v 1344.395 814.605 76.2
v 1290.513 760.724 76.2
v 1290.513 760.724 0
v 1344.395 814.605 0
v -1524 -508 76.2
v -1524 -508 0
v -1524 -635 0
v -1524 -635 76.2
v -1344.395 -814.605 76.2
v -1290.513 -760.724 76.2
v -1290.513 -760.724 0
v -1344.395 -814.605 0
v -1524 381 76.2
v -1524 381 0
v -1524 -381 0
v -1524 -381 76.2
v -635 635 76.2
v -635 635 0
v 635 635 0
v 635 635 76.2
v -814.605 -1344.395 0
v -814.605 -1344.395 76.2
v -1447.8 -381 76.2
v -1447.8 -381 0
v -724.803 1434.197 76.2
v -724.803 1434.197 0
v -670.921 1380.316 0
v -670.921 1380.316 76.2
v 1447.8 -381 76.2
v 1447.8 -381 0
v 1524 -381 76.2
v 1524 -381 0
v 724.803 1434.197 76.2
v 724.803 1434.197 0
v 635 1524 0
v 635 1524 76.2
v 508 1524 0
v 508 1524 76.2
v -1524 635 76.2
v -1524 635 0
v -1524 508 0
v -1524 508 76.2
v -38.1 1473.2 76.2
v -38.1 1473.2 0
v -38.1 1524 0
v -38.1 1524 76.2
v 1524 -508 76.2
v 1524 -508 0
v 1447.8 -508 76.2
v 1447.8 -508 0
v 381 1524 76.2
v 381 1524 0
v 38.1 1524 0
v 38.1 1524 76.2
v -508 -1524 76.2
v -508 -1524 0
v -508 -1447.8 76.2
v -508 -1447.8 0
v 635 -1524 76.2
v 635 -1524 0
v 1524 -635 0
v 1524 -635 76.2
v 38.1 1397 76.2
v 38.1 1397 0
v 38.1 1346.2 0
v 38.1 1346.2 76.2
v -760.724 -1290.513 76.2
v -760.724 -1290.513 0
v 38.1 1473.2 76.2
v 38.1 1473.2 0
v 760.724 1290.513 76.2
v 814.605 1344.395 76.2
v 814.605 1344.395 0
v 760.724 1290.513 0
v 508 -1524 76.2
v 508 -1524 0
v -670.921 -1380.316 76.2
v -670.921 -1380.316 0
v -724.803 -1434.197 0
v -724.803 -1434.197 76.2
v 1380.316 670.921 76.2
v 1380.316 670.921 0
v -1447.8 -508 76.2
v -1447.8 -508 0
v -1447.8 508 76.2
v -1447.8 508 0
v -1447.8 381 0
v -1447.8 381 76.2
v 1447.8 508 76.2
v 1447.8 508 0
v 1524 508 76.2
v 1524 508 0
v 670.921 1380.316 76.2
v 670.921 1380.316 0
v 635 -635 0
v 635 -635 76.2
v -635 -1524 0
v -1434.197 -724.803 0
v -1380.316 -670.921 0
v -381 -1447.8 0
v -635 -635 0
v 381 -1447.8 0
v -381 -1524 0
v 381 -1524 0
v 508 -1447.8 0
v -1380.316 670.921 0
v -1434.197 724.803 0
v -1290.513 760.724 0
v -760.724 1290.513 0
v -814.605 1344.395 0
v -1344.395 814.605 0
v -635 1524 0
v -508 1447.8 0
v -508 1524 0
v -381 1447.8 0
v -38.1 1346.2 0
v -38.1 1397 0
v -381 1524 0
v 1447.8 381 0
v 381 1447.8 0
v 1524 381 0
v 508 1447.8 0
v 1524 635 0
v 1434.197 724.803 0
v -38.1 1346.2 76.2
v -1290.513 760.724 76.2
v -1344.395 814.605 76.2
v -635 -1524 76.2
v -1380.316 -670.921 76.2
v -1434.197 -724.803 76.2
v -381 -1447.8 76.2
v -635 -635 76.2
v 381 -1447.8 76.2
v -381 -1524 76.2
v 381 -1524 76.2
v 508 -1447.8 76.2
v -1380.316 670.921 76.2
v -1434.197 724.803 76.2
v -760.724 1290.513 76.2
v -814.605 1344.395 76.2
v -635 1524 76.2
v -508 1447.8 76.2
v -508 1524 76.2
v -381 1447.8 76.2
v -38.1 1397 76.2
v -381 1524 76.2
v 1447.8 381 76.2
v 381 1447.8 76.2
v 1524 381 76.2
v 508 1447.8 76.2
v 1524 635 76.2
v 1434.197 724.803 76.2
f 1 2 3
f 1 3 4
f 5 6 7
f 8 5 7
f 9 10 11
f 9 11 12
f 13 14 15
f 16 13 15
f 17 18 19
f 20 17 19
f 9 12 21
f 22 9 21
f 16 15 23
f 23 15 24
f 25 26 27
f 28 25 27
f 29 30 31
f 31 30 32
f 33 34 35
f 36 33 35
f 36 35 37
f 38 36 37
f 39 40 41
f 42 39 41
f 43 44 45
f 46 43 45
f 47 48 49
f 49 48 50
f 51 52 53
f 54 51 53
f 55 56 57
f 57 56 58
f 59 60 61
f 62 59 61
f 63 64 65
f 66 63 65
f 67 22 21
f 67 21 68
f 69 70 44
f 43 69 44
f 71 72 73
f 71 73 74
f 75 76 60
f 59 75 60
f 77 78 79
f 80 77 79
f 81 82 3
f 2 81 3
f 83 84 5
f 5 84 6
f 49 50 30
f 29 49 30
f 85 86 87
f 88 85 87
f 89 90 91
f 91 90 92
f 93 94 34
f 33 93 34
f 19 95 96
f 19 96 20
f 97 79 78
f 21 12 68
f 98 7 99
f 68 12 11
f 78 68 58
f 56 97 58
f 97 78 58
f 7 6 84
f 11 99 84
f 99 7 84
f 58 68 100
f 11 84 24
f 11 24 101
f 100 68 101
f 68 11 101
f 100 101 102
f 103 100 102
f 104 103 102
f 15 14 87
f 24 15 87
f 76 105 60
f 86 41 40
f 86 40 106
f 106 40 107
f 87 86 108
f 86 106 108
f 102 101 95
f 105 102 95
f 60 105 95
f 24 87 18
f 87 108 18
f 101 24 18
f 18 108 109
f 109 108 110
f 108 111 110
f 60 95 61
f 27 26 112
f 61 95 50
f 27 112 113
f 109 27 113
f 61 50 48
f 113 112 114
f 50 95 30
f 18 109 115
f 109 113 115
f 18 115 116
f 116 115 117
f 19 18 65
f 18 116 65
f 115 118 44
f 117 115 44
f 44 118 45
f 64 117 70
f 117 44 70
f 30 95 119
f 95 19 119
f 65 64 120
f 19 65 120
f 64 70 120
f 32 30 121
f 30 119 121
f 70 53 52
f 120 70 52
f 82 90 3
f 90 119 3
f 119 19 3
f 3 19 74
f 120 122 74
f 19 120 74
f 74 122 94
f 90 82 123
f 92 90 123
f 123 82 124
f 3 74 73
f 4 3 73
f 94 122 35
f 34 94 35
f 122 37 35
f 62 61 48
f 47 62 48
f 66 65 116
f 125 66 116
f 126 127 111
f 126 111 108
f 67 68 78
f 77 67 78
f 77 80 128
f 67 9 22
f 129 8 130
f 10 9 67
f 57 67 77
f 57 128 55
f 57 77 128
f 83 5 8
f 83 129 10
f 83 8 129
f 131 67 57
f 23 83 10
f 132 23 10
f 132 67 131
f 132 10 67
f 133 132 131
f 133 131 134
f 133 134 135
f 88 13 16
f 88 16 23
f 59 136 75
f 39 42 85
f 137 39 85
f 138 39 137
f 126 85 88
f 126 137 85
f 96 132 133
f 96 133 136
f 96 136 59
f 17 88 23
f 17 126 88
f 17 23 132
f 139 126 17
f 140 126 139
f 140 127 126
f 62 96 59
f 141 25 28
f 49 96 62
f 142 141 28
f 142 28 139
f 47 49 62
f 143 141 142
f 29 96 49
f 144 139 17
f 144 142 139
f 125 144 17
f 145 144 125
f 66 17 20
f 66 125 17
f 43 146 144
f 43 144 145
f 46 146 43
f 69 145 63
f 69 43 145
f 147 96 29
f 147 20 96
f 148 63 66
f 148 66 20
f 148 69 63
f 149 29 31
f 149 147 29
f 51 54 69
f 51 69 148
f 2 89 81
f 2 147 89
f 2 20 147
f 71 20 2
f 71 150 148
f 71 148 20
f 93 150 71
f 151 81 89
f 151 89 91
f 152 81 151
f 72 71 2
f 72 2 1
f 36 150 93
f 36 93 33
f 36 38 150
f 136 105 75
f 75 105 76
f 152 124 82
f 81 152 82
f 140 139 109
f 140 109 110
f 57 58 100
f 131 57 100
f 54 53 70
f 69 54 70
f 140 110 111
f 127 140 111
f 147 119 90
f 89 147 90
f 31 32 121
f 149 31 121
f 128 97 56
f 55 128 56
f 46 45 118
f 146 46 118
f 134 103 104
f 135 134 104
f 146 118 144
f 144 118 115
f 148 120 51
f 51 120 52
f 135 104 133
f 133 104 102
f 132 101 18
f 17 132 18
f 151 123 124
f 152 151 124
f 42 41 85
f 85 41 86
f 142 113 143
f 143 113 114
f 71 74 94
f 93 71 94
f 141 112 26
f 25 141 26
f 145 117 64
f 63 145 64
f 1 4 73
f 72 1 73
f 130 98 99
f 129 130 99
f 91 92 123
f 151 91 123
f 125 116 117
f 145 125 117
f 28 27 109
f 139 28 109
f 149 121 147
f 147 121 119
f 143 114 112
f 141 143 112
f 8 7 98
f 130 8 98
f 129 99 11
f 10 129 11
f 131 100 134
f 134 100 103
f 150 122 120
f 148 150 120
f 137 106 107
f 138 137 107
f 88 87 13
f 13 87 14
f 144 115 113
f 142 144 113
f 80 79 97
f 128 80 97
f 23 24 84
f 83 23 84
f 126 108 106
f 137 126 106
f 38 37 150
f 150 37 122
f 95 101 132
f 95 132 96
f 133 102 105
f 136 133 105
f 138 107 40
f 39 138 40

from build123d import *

# Parameters (mm, degrees)
F0_W     = 1270
F0_H     = 1270
F0_W_2   = 38.1
F0_H_2   = 76.2
F1_DEPTH = 25.4
F2_DEPTH = 76.2


# Not quite as in the source:
# - ends of sketch curves that miss each other by under 0.0002 mm in the source are joined


with BuildPart() as f1:
    # F0 (on Top) → F1 (new body)
    with BuildSketch(Plane.XY):
        Polygon((-1434.1974387893, 724.8025612107), (-1524, 635), (-1524, 508), (-1447.8, 508), (-1447.8, 381), (-1524, 381), (-1524, -381), (-1447.8, -381), (-1447.8, -508), (-1524, -508), (-1524, -635), (-1434.1974387893, -724.8025612107), (-1380.3159020629, -670.9210244843), (-1290.5133408522, -760.723585695), (-1344.3948775786, -814.6051224214), (-814.6051224214, -1344.3948775786), (-760.723585695, -1290.5133408522), (-670.9210244843, -1380.3159020629), (-724.8025612107, -1434.1974387893), (-635, -1524), (-508, -1524), (-508, -1447.8), (-381, -1447.8), (-381, -1524), (0, -1524), (381, -1524), (381, -1447.8), (508, -1447.8), (508, -1524), (635, -1524), (724.8025612107, -1434.1974387893), (670.9210244843, -1380.3159020629), (760.723585695, -1290.5133408522), (814.6051224214, -1344.3948775786), (1344.3948775786, -814.6051224214), (1290.5133408522, -760.723585695), (1380.3159020629, -670.9210244843), (1434.1974387893, -724.8025612107), (1524, -635), (1524, -508), (1447.8, -508), (1447.8, -381), (1524, -381), (1524, 381), (1447.8, 381), (1447.8, 508), (1524, 508), (1524, 635), (1434.1974387893, 724.8025612107), (1380.3159020629, 670.9210244843), (1290.5133408522, 760.723585695), (1344.3948775786, 814.6051224214), (814.6051224214, 1344.3948775786), (760.723585695, 1290.5133408522), (670.9210244843, 1380.3159020629), (724.8025612107, 1434.1974387893), (635, 1524), (508, 1524), (508, 1447.8), (381, 1447.8), (381, 1524), (38.1, 1524), (38.1, 1473.2), (38.1, 1397), (38.1, 1346.2), (-38.1, 1346.2), (-38.1, 1397), (-38.1, 1473.2), (-38.1, 1523.9999635696), (-381, 1524), (-381, 1447.8), (-508, 1447.8), (-508, 1524), (-635, 1524), (-724.8025612107, 1434.1974387893), (-670.9210244843, 1380.3159020629), (-760.723585695, 1290.5133408522), (-814.6051224214, 1344.3948775786), (-1344.3948775786, 814.6051224214), (-1290.5133408522, 760.723585695), (-1380.3159020629, 670.9210244843), align=None)
        Rectangle(F0_W, F0_H, mode=Mode.SUBTRACT)
        with Locations((-19.05, 1435.1)):
            Rectangle(F0_W_2, F0_H_2)
        with Locations((19.05, 1435.1)):
            Rectangle(F0_W_2, F0_H_2)
        Polygon((670.9210244843, -1380.3159020629), (724.8025612107, -1434.1974387893), (814.6051224214, -1344.3948775786), (760.723585695, -1290.5133408522), align=None)
        Polygon((1290.5133408522, -760.723585695), (1344.3948775786, -814.6051224214), (1434.1974387893, -724.8025612107), (1380.3159020629, -670.9210244843), align=None)
    extrude(amount=F1_DEPTH)

    # F0 (on Top) → F2 (join)
    with BuildSketch(Plane.XY):
        Polygon((-1434.1974387893, 724.8025612107), (-1524, 635), (-1524, 508), (-1447.8, 508), (-1447.8, 381), (-1524, 381), (-1524, -381), (-1447.8, -381), (-1447.8, -508), (-1524, -508), (-1524, -635), (-1434.1974387893, -724.8025612107), (-1380.3159020629, -670.9210244843), (-1290.5133408522, -760.723585695), (-1344.3948775786, -814.6051224214), (-814.6051224214, -1344.3948775786), (-760.723585695, -1290.5133408522), (-670.9210244843, -1380.3159020629), (-724.8025612107, -1434.1974387893), (-635, -1524), (-508, -1524), (-508, -1447.8), (-381, -1447.8), (-381, -1524), (0, -1524), (381, -1524), (381, -1447.8), (508, -1447.8), (508, -1524), (635, -1524), (724.8025612107, -1434.1974387893), (670.9210244843, -1380.3159020629), (760.723585695, -1290.5133408522), (814.6051224214, -1344.3948775786), (1344.3948775786, -814.6051224214), (1290.5133408522, -760.723585695), (1380.3159020629, -670.9210244843), (1434.1974387893, -724.8025612107), (1524, -635), (1524, -508), (1447.8, -508), (1447.8, -381), (1524, -381), (1524, 381), (1447.8, 381), (1447.8, 508), (1524, 508), (1524, 635), (1434.1974387893, 724.8025612107), (1380.3159020629, 670.9210244843), (1290.5133408522, 760.723585695), (1344.3948775786, 814.6051224214), (814.6051224214, 1344.3948775786), (760.723585695, 1290.5133408522), (670.9210244843, 1380.3159020629), (724.8025612107, 1434.1974387893), (635, 1524), (508, 1524), (508, 1447.8), (381, 1447.8), (381, 1524), (38.1, 1524), (38.1, 1473.2), (38.1, 1397), (38.1, 1346.2), (-38.1, 1346.2), (-38.1, 1397), (-38.1, 1473.2), (-38.1, 1523.9999635696), (-381, 1524), (-381, 1447.8), (-508, 1447.8), (-508, 1524), (-635, 1524), (-724.8025612107, 1434.1974387893), (-670.9210244843, 1380.3159020629), (-760.723585695, 1290.5133408522), (-814.6051224214, 1344.3948775786), (-1344.3948775786, 814.6051224214), (-1290.5133408522, 760.723585695), (-1380.3159020629, 670.9210244843), align=None)
        Rectangle(F0_W, F0_H, mode=Mode.SUBTRACT)
        with Locations((-19.05, 1435.1)):
            Rectangle(F0_W_2, F0_H_2)
        with Locations((19.05, 1435.1)):
            Rectangle(F0_W_2, F0_H_2)
        Polygon((670.9210244843, -1380.3159020629), (724.8025612107, -1434.1974387893), (814.6051224214, -1344.3948775786), (760.723585695, -1290.5133408522), align=None)
        Polygon((1290.5133408522, -760.723585695), (1344.3948775786, -814.6051224214), (1434.1974387893, -724.8025612107), (1380.3159020629, -670.9210244843), align=None)
    extrude(amount=F2_DEPTH)


solid = f1.part
